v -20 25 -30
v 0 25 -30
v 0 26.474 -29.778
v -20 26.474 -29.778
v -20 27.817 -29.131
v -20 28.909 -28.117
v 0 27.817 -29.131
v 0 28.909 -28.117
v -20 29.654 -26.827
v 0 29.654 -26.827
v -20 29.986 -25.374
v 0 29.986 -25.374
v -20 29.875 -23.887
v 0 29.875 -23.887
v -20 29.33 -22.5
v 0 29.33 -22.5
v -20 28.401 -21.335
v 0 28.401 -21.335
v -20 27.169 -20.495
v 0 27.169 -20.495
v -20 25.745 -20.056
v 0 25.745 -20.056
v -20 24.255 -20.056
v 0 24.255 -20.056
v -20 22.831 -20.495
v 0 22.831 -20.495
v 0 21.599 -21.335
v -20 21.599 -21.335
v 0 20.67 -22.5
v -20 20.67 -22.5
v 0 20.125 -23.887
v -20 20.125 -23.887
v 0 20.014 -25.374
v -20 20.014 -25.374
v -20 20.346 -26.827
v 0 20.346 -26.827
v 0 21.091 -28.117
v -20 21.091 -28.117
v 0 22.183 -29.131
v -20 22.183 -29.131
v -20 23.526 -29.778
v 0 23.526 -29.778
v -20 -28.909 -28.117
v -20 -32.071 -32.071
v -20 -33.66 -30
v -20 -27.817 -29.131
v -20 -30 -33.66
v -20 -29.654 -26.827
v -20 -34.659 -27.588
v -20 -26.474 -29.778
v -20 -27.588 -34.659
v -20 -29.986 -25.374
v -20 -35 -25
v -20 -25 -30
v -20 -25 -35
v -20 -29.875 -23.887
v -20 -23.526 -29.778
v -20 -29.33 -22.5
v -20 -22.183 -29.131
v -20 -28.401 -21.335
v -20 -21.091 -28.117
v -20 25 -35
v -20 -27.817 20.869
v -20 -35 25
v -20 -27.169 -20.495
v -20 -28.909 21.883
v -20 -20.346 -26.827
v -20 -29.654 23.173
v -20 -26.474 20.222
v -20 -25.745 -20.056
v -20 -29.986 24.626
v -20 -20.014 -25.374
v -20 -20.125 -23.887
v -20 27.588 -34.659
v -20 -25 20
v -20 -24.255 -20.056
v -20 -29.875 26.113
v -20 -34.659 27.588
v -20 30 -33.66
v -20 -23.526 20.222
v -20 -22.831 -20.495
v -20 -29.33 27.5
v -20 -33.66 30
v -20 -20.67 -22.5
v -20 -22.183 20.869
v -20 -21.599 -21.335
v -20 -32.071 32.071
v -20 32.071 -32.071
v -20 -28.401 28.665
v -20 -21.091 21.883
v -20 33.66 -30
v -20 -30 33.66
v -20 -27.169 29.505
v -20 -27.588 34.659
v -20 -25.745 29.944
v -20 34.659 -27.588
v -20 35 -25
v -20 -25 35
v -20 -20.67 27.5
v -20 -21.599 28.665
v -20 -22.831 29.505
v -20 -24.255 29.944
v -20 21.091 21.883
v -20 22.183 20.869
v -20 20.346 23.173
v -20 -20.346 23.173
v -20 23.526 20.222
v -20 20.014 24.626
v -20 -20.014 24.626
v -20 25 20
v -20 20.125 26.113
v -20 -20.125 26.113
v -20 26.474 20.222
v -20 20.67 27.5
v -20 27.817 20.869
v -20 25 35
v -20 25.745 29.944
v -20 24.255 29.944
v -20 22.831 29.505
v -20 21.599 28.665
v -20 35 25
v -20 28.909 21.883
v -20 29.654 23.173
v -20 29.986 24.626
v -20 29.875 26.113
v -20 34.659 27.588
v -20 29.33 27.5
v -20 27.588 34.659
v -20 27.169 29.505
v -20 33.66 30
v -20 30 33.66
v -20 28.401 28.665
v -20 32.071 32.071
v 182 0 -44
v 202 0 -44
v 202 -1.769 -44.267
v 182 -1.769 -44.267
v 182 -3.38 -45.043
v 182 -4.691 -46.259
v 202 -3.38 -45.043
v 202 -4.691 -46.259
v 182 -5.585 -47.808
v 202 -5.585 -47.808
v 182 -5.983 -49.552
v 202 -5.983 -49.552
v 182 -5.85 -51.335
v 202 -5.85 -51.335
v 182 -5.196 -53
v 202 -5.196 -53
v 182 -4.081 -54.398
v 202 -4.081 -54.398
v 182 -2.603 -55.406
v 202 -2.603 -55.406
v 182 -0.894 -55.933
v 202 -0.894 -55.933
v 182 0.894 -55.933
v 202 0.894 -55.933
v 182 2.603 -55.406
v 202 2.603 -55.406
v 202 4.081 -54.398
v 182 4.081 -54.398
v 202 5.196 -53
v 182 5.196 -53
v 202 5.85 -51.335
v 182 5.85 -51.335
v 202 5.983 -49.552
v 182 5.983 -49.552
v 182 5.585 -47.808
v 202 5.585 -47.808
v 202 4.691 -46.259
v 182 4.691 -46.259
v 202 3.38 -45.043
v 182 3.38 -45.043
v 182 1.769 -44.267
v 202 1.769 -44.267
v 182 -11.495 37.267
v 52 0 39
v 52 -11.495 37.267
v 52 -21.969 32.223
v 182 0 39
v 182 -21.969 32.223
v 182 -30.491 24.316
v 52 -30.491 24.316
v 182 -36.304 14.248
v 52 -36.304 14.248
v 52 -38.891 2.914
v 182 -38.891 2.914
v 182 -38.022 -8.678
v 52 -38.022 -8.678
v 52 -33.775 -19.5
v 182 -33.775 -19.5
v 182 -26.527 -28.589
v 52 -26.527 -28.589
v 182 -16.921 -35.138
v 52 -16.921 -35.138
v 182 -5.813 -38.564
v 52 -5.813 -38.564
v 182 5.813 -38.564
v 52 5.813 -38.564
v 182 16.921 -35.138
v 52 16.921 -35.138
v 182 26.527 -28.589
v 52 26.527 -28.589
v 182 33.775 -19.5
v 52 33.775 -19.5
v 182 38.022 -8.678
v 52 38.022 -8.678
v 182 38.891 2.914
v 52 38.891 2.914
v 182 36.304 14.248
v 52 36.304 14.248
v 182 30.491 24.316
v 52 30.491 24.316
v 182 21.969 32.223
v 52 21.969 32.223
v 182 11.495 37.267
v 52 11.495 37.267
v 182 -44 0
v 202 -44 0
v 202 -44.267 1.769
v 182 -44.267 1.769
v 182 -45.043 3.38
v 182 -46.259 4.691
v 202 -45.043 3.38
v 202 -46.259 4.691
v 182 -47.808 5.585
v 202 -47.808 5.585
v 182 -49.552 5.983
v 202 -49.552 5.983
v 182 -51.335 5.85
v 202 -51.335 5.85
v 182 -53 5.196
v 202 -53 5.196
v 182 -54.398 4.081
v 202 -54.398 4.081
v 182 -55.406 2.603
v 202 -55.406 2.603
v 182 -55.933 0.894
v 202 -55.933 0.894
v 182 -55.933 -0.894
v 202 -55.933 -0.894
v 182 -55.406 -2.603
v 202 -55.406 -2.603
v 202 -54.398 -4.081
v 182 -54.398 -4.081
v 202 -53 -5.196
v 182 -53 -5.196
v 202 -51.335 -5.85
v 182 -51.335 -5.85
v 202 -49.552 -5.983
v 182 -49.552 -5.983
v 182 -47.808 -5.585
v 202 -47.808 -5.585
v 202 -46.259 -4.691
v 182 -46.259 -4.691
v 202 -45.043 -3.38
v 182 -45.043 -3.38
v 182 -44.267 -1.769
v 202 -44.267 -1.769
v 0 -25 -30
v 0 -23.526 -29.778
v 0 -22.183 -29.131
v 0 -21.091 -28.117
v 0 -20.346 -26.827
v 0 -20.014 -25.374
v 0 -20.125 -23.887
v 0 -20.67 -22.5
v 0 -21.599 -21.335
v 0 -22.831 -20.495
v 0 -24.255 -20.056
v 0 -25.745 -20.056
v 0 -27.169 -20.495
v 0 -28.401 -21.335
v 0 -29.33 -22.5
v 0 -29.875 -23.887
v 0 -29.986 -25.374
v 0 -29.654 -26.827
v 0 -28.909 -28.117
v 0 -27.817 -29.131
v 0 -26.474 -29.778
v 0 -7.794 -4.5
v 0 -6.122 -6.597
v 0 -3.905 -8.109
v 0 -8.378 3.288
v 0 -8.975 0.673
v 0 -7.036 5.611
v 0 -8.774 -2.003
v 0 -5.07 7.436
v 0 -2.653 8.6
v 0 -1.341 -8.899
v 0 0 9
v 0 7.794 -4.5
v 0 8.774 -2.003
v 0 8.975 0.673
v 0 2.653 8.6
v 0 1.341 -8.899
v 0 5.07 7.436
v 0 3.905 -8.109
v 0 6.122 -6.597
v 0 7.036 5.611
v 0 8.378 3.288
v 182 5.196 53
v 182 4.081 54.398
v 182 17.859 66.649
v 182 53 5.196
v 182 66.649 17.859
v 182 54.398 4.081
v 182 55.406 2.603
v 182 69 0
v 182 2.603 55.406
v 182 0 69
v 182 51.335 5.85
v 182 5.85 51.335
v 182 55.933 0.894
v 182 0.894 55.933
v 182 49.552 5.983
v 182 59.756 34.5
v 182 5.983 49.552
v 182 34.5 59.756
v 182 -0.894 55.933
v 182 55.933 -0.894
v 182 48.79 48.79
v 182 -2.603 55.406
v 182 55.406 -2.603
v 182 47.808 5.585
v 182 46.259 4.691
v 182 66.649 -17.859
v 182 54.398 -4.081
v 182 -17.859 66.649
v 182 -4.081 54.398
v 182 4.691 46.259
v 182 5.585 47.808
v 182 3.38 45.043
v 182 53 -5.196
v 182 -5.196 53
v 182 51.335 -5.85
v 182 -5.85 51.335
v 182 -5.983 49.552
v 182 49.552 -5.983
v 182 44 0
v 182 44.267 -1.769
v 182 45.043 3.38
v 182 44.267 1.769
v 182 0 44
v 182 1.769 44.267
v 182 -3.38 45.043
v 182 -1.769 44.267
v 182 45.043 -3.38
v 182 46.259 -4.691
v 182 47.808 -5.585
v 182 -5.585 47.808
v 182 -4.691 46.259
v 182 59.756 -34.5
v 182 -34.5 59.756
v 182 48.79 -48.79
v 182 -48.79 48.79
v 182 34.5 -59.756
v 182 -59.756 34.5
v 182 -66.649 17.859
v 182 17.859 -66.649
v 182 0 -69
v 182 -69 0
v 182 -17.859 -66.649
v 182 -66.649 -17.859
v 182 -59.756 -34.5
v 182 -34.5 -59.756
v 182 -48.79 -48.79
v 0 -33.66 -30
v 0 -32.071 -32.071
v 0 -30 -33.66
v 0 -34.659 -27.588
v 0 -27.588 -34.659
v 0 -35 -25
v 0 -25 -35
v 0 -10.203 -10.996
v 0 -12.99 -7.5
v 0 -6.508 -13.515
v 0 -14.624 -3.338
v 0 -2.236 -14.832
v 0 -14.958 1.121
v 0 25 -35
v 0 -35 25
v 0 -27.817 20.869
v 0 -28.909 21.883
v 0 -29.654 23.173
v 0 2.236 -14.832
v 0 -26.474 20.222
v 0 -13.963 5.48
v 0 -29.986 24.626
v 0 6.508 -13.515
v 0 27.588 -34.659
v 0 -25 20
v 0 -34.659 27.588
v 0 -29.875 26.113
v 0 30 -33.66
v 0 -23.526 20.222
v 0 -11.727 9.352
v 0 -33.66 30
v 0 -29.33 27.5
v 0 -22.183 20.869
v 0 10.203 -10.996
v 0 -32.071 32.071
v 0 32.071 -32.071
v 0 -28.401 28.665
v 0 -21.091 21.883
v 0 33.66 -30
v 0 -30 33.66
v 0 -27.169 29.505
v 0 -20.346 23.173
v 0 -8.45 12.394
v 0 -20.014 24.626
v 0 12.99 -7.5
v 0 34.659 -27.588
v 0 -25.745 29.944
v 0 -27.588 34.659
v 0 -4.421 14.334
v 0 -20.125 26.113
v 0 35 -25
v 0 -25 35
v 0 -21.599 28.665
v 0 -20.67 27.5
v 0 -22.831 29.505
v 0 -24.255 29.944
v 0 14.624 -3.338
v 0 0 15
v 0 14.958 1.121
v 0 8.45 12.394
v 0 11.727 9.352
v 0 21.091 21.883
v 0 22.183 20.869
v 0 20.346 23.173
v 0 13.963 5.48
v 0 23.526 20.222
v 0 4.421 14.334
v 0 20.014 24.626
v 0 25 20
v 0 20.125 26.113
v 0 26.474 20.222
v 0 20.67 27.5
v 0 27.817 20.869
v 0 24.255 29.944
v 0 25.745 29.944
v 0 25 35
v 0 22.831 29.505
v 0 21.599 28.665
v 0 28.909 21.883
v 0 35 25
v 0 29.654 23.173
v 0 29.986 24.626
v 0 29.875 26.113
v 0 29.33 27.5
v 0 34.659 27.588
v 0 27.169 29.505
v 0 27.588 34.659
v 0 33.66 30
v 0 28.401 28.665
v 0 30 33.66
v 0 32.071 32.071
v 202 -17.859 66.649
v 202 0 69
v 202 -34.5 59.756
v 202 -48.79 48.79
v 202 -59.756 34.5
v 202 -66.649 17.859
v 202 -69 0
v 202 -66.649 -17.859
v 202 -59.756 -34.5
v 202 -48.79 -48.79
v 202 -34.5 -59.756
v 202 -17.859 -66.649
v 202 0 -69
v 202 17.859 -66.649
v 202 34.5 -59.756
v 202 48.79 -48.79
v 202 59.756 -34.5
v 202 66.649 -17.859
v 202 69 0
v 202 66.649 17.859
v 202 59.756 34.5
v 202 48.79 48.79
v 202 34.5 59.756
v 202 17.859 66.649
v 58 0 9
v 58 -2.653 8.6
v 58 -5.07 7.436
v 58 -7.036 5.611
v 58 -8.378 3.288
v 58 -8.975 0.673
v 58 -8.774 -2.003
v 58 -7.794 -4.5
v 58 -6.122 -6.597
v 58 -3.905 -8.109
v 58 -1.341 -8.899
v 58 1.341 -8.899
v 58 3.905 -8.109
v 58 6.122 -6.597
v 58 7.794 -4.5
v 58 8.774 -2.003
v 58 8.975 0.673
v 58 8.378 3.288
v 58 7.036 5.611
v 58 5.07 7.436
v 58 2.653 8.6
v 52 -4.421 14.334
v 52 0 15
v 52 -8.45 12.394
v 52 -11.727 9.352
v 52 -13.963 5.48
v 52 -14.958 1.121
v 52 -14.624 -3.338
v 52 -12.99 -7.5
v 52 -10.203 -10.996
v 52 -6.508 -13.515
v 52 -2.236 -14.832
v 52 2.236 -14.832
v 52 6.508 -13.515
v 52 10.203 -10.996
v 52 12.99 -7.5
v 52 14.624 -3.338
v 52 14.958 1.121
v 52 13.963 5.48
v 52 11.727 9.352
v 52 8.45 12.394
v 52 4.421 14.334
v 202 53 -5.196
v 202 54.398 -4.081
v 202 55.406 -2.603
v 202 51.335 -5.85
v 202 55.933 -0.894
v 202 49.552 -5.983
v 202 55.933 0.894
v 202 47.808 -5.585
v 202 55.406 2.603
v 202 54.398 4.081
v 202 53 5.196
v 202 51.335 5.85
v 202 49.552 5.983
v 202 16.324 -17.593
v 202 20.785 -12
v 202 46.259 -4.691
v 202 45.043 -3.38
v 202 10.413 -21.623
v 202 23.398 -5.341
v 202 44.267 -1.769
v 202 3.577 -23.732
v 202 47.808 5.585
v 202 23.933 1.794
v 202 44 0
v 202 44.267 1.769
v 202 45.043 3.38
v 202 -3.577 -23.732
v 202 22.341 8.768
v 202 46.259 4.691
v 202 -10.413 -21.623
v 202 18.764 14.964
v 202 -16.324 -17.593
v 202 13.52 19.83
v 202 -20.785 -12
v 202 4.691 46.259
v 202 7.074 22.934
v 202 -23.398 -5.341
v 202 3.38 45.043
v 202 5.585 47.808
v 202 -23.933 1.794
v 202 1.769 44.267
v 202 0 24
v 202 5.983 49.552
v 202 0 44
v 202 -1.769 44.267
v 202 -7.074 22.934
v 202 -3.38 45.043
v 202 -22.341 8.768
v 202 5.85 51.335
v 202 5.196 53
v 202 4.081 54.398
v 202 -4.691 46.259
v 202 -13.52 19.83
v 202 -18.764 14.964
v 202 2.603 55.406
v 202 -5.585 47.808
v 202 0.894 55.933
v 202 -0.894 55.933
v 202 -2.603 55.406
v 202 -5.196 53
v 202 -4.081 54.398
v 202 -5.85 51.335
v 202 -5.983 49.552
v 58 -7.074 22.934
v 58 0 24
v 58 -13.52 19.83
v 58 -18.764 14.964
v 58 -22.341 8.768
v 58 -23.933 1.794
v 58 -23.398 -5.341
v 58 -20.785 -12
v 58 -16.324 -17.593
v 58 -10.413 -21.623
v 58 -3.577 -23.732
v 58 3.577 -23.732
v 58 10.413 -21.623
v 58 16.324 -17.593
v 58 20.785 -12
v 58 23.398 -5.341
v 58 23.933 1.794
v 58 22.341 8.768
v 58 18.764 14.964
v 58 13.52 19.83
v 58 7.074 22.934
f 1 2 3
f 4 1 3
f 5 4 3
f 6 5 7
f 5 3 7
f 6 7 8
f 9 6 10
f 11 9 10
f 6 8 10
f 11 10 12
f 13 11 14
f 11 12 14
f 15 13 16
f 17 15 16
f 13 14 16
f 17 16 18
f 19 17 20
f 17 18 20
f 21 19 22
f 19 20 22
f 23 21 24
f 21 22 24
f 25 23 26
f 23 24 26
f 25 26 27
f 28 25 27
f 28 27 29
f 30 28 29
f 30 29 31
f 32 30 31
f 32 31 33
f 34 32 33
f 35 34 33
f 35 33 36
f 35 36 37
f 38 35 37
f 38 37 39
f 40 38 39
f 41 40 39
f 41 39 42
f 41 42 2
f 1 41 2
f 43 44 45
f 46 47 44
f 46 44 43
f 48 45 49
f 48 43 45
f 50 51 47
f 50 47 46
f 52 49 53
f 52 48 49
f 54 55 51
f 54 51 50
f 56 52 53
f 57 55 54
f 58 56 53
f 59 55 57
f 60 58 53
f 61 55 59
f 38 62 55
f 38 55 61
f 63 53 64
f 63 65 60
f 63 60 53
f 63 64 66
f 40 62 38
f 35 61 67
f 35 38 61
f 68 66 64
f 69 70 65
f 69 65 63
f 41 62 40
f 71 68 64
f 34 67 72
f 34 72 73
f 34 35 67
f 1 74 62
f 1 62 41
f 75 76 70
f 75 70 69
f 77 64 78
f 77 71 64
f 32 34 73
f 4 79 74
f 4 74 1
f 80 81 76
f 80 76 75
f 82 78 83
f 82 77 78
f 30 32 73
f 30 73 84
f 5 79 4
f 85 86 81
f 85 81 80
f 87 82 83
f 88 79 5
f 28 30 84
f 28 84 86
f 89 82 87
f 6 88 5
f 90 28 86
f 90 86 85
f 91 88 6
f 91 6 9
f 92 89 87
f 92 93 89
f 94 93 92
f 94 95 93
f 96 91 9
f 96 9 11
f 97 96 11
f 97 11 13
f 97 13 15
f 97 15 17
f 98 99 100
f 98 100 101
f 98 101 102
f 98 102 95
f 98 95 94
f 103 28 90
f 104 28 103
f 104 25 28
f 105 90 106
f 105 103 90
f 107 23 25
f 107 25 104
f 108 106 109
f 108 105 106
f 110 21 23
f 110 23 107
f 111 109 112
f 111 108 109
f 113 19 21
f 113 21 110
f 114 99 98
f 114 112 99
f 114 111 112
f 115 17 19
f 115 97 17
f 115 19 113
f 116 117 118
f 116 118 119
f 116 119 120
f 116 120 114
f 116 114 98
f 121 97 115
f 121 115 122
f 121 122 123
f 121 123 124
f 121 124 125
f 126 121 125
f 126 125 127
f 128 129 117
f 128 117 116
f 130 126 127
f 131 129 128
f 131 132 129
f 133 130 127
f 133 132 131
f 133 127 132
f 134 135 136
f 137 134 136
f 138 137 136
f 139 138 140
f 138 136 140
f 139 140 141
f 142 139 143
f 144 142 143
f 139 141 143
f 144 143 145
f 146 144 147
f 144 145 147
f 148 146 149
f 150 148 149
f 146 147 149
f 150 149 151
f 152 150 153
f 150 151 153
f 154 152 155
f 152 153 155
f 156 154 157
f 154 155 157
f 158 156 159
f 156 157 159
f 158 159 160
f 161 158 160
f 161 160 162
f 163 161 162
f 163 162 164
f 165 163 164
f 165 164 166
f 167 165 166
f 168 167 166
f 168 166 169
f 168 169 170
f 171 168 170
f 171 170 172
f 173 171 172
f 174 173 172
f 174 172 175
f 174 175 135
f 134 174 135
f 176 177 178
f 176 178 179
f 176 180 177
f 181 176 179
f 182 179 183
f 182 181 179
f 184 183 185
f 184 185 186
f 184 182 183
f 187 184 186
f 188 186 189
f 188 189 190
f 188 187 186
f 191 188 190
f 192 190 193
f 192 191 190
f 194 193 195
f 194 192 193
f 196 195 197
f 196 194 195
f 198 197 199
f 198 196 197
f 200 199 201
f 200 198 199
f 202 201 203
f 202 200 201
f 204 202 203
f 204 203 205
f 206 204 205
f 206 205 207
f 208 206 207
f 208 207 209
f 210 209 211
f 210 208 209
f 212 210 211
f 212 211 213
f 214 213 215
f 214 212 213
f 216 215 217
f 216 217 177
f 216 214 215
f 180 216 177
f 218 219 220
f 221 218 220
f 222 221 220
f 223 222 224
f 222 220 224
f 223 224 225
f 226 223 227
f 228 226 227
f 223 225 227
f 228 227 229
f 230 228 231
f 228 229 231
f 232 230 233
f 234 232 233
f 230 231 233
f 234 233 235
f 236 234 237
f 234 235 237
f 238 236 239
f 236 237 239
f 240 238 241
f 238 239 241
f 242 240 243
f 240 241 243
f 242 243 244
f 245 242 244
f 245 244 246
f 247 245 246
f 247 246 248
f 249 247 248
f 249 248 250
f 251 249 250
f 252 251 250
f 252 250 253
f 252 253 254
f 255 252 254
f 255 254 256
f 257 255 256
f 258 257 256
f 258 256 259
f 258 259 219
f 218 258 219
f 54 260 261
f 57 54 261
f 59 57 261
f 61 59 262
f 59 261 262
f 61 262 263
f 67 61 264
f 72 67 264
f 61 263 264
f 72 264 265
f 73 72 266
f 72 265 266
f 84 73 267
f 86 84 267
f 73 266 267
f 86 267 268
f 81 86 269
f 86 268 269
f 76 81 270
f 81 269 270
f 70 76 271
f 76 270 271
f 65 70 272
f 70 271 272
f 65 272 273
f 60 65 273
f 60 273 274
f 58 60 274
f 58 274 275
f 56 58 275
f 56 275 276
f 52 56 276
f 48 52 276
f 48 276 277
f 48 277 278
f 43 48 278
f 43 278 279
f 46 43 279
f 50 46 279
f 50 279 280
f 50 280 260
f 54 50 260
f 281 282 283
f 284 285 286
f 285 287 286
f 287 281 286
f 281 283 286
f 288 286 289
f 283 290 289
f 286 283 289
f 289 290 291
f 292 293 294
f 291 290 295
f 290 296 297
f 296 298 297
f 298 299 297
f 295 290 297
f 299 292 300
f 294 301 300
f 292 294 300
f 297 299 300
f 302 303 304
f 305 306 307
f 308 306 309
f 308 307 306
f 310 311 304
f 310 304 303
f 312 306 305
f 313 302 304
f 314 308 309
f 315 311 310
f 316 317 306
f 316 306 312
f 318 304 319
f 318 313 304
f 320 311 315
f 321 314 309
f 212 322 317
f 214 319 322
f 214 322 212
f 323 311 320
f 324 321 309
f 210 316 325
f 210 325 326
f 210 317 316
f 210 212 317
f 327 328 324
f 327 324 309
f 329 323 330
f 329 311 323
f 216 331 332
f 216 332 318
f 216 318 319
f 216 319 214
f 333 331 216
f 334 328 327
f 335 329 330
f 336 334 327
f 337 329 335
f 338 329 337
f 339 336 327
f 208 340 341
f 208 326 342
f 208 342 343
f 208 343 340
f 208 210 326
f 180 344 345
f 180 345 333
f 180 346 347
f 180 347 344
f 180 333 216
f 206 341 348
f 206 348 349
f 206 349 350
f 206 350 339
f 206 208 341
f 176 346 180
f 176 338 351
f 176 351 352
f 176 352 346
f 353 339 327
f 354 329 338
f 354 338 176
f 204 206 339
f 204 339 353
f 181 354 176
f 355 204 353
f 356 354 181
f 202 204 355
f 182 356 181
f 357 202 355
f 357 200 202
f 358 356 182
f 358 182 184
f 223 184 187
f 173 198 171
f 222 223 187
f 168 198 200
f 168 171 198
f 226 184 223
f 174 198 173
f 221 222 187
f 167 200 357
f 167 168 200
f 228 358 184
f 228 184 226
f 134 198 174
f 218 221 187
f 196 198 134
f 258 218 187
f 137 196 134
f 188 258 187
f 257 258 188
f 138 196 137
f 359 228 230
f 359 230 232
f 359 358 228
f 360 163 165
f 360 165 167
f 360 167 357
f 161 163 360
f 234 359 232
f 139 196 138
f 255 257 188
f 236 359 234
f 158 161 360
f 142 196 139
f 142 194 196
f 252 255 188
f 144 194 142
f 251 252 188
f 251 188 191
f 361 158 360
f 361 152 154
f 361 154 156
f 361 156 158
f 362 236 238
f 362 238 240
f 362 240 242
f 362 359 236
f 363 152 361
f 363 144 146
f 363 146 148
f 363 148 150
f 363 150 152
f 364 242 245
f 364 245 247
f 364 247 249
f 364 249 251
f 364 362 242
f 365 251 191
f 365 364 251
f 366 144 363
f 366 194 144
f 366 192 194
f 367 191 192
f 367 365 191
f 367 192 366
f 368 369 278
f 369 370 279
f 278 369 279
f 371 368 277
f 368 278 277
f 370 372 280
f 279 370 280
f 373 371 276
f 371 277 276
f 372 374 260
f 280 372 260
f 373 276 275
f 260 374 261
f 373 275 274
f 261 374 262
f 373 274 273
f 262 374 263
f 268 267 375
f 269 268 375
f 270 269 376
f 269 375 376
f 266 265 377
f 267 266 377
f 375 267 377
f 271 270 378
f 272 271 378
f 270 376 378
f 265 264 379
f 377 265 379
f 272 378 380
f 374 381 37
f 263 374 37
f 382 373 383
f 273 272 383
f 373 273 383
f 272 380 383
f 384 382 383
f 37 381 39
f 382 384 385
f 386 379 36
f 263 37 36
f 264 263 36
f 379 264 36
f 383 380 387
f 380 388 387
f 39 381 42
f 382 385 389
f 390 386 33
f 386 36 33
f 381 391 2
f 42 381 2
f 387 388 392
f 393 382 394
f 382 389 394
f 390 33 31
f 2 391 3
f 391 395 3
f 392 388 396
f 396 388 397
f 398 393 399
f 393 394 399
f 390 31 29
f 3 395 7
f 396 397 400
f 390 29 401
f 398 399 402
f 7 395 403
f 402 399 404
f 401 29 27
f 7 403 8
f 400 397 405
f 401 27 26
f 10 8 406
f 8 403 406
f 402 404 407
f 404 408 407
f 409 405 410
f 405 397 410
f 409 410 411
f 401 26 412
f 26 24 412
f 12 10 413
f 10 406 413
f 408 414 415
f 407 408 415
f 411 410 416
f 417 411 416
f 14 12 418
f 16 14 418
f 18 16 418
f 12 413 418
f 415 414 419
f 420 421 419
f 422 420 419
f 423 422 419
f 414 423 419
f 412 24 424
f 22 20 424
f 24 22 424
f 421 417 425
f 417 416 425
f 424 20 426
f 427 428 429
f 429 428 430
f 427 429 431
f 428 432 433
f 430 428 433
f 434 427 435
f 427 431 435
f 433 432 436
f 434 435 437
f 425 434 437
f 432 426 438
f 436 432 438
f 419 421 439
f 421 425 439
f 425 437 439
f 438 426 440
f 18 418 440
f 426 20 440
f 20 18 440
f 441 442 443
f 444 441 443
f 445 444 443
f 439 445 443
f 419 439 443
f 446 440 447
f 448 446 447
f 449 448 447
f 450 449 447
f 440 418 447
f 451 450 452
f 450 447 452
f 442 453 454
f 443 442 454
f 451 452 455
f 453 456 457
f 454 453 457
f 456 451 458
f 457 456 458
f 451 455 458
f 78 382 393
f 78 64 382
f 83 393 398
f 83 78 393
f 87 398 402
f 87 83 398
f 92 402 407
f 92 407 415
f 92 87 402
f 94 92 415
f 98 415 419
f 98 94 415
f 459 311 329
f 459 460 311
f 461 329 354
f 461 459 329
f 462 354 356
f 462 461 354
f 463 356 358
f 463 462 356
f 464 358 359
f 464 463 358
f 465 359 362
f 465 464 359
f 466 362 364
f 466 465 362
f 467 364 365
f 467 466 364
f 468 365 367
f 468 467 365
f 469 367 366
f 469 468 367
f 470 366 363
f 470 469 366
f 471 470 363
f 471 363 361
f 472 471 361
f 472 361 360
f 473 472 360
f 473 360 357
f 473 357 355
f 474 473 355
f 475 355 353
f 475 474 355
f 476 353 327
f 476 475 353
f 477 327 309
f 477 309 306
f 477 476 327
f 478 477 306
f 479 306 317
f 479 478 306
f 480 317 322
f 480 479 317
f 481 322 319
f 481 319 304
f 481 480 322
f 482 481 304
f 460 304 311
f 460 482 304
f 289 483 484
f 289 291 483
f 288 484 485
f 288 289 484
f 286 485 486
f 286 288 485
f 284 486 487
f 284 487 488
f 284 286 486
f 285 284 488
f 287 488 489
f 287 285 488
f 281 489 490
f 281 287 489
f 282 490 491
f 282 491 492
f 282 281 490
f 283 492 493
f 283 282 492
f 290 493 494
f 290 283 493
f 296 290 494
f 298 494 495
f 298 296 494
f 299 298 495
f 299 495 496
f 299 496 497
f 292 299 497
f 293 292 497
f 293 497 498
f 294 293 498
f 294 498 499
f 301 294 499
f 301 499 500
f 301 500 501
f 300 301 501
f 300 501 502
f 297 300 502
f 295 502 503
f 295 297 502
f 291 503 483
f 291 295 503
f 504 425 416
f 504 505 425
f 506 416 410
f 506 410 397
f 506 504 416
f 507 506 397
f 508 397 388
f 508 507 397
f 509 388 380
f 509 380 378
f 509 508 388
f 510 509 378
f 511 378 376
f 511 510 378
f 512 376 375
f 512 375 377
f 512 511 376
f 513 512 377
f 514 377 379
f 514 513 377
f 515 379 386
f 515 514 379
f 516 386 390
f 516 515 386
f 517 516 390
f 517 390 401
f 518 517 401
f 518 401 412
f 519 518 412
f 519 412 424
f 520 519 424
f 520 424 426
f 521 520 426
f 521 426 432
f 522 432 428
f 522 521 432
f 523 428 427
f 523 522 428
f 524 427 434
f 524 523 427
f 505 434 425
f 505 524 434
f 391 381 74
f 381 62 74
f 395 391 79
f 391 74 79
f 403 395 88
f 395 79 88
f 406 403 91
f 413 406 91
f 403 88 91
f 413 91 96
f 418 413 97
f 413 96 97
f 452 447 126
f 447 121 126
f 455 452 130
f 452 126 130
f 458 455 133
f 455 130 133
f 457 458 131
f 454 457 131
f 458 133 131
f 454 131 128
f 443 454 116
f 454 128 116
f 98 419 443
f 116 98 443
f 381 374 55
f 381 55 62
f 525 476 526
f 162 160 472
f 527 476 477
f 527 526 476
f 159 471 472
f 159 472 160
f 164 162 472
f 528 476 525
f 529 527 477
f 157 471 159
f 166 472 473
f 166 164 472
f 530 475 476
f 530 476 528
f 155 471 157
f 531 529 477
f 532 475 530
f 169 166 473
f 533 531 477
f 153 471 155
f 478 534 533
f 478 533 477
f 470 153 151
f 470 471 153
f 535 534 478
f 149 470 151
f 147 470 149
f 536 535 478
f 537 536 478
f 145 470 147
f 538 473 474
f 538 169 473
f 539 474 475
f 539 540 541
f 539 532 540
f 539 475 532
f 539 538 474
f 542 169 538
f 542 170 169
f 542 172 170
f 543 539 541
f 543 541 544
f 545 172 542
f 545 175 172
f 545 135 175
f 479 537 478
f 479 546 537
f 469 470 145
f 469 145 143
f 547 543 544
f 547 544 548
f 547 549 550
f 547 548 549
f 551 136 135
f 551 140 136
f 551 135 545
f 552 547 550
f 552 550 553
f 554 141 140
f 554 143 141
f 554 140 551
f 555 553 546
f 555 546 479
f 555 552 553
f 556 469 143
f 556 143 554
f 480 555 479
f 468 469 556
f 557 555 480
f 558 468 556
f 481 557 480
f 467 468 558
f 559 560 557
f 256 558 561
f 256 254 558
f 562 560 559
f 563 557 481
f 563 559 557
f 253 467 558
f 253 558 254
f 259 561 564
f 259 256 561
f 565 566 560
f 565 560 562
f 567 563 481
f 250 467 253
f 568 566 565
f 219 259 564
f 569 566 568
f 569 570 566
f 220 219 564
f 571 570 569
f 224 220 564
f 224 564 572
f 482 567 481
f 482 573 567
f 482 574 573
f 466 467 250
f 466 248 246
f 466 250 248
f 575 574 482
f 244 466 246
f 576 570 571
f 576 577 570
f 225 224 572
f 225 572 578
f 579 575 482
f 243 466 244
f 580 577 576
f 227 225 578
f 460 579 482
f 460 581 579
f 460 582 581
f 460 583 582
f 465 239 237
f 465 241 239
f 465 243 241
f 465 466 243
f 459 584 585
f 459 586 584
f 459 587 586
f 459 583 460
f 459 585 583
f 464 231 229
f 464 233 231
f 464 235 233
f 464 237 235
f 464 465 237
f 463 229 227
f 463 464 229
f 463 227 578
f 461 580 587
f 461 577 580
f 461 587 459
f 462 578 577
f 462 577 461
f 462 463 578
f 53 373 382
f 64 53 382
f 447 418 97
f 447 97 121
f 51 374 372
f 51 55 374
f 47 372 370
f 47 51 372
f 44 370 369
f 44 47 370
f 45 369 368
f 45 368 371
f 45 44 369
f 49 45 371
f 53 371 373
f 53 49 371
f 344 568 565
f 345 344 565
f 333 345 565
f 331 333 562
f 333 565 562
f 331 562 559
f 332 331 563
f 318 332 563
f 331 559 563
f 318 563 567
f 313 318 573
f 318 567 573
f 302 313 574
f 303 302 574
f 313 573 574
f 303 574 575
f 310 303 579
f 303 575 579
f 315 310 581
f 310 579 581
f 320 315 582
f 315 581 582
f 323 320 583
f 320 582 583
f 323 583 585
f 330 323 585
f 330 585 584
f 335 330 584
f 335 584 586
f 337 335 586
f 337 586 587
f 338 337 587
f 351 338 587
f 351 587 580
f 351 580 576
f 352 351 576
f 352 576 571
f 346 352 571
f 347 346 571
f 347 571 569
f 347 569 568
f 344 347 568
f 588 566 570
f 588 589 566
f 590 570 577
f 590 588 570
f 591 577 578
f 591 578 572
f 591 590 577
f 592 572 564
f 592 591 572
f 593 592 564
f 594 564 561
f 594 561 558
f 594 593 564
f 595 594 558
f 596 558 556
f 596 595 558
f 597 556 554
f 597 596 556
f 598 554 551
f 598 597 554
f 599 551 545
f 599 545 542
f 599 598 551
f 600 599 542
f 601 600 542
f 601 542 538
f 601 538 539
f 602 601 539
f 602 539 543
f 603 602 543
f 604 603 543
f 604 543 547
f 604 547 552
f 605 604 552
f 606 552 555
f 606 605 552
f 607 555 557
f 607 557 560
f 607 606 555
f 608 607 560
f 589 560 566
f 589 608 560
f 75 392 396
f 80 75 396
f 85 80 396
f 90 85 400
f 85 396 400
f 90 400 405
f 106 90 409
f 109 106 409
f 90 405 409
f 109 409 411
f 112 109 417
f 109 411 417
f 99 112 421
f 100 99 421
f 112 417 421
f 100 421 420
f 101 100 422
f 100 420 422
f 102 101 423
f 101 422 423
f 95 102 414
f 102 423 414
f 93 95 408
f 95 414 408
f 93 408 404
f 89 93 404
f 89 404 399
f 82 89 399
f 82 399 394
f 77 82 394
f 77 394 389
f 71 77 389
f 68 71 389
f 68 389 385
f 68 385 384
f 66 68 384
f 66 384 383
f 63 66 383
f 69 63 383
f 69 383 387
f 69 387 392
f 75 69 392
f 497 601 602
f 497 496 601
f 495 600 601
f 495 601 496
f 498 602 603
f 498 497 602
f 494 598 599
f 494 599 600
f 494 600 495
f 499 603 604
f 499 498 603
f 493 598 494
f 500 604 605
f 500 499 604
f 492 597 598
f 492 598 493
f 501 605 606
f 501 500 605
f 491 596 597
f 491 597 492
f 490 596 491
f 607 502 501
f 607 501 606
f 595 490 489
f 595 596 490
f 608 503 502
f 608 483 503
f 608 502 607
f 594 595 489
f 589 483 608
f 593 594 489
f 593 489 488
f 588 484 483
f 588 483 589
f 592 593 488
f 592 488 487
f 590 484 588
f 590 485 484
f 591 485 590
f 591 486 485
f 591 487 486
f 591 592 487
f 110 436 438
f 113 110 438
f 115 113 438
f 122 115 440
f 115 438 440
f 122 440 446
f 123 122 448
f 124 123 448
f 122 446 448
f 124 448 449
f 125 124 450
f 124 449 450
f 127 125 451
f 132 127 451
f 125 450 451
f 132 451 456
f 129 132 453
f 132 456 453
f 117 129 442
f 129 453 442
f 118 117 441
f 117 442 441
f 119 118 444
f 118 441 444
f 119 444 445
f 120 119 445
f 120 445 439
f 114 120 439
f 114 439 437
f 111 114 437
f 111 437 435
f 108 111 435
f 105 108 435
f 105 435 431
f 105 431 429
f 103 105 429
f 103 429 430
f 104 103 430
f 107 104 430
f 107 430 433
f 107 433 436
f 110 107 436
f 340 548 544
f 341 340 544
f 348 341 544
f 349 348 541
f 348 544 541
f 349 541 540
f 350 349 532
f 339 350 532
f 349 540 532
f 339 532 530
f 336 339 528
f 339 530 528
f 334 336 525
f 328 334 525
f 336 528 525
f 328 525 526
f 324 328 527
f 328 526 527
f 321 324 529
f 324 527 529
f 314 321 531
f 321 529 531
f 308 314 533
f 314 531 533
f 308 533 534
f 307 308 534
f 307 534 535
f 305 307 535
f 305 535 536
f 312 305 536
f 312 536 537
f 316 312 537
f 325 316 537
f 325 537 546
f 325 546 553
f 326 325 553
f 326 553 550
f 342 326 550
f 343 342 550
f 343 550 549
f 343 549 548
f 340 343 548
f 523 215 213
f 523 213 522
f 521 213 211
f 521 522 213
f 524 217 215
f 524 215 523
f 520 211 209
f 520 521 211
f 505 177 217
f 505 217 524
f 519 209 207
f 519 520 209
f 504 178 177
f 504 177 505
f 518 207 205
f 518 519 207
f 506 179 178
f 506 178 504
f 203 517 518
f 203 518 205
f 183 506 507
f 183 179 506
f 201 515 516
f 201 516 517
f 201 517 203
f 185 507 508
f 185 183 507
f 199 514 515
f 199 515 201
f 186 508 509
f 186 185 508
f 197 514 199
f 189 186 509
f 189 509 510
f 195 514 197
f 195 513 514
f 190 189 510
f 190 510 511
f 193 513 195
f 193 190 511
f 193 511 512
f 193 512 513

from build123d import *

# Parameters (mm, degrees)
SKETCH2_W           = 70
SKETCH2_H           = 70
BOSS_EXTRUDE1_DEPTH = 20
FILLET1_R           = 10
HOLE1_D             = 10
HOLE1_DEPTH         = 20
HOLE2_D             = 12
CIRPATTERN1_COUNT   = 4


with BuildPart() as part:
    # Sketch1 → Revolve1 (revolve)
    with BuildSketch(Plane(origin=(0, 0, 0), x_dir=(1, 0, 0), z_dir=(0, 1, 0)), mode=Mode.PRIVATE) as revolve1_sk:
        Polygon((0, 15), (52, 15), (52, 39), (182, 39), (182, 69), (202, 69), (202, 24), (58, 24), (58, 9), (0, 9), align=None)
    revolve(revolve1_sk.sketch.rotate(Axis((0, 0, 0), (1, 0, 0)), 180), axis=Axis((0, 0, 0), (1, 0, 0)))

    # Sketch2 → Boss-Extrude1 (add)
    with BuildSketch(Plane.ZY):
        Rectangle(SKETCH2_W, SKETCH2_H)
    extrude(amount=BOSS_EXTRUDE1_DEPTH)

    # Fillet1
    fillet1_edges = [part.edges().sort_by_distance(p)[0] for p in [
        (-10, -35, 35),
        (-10, 35, 35),
        (-10, 35, -35),
        (-10, -35, -35),
    ]]
    fillet(fillet1_edges, radius=FILLET1_R)

    # Hole1
    with Locations(Plane.ZY.offset(20)):
        with Locations((25, 25), (25, -25), (-25, -25), (-25, 25)):
            Hole(HOLE1_D / 2, depth=HOLE1_DEPTH)

    # Hole2 (through all)
    with Locations(Plane.ZY.offset(-182)):
        with Locations((50, 0)):
            hole2 = Hole(HOLE2_D / 2)

    # CirPattern1: Hole2 ×4 about axis
    cirpattern1_axis = Axis((0, 0, 0), (1, 0, 0))
    for i in range(1, CIRPATTERN1_COUNT):
        add(hole2.rotate(cirpattern1_axis, i * 360 / CIRPATTERN1_COUNT), mode=Mode.SUBTRACT)


solid = part.part
